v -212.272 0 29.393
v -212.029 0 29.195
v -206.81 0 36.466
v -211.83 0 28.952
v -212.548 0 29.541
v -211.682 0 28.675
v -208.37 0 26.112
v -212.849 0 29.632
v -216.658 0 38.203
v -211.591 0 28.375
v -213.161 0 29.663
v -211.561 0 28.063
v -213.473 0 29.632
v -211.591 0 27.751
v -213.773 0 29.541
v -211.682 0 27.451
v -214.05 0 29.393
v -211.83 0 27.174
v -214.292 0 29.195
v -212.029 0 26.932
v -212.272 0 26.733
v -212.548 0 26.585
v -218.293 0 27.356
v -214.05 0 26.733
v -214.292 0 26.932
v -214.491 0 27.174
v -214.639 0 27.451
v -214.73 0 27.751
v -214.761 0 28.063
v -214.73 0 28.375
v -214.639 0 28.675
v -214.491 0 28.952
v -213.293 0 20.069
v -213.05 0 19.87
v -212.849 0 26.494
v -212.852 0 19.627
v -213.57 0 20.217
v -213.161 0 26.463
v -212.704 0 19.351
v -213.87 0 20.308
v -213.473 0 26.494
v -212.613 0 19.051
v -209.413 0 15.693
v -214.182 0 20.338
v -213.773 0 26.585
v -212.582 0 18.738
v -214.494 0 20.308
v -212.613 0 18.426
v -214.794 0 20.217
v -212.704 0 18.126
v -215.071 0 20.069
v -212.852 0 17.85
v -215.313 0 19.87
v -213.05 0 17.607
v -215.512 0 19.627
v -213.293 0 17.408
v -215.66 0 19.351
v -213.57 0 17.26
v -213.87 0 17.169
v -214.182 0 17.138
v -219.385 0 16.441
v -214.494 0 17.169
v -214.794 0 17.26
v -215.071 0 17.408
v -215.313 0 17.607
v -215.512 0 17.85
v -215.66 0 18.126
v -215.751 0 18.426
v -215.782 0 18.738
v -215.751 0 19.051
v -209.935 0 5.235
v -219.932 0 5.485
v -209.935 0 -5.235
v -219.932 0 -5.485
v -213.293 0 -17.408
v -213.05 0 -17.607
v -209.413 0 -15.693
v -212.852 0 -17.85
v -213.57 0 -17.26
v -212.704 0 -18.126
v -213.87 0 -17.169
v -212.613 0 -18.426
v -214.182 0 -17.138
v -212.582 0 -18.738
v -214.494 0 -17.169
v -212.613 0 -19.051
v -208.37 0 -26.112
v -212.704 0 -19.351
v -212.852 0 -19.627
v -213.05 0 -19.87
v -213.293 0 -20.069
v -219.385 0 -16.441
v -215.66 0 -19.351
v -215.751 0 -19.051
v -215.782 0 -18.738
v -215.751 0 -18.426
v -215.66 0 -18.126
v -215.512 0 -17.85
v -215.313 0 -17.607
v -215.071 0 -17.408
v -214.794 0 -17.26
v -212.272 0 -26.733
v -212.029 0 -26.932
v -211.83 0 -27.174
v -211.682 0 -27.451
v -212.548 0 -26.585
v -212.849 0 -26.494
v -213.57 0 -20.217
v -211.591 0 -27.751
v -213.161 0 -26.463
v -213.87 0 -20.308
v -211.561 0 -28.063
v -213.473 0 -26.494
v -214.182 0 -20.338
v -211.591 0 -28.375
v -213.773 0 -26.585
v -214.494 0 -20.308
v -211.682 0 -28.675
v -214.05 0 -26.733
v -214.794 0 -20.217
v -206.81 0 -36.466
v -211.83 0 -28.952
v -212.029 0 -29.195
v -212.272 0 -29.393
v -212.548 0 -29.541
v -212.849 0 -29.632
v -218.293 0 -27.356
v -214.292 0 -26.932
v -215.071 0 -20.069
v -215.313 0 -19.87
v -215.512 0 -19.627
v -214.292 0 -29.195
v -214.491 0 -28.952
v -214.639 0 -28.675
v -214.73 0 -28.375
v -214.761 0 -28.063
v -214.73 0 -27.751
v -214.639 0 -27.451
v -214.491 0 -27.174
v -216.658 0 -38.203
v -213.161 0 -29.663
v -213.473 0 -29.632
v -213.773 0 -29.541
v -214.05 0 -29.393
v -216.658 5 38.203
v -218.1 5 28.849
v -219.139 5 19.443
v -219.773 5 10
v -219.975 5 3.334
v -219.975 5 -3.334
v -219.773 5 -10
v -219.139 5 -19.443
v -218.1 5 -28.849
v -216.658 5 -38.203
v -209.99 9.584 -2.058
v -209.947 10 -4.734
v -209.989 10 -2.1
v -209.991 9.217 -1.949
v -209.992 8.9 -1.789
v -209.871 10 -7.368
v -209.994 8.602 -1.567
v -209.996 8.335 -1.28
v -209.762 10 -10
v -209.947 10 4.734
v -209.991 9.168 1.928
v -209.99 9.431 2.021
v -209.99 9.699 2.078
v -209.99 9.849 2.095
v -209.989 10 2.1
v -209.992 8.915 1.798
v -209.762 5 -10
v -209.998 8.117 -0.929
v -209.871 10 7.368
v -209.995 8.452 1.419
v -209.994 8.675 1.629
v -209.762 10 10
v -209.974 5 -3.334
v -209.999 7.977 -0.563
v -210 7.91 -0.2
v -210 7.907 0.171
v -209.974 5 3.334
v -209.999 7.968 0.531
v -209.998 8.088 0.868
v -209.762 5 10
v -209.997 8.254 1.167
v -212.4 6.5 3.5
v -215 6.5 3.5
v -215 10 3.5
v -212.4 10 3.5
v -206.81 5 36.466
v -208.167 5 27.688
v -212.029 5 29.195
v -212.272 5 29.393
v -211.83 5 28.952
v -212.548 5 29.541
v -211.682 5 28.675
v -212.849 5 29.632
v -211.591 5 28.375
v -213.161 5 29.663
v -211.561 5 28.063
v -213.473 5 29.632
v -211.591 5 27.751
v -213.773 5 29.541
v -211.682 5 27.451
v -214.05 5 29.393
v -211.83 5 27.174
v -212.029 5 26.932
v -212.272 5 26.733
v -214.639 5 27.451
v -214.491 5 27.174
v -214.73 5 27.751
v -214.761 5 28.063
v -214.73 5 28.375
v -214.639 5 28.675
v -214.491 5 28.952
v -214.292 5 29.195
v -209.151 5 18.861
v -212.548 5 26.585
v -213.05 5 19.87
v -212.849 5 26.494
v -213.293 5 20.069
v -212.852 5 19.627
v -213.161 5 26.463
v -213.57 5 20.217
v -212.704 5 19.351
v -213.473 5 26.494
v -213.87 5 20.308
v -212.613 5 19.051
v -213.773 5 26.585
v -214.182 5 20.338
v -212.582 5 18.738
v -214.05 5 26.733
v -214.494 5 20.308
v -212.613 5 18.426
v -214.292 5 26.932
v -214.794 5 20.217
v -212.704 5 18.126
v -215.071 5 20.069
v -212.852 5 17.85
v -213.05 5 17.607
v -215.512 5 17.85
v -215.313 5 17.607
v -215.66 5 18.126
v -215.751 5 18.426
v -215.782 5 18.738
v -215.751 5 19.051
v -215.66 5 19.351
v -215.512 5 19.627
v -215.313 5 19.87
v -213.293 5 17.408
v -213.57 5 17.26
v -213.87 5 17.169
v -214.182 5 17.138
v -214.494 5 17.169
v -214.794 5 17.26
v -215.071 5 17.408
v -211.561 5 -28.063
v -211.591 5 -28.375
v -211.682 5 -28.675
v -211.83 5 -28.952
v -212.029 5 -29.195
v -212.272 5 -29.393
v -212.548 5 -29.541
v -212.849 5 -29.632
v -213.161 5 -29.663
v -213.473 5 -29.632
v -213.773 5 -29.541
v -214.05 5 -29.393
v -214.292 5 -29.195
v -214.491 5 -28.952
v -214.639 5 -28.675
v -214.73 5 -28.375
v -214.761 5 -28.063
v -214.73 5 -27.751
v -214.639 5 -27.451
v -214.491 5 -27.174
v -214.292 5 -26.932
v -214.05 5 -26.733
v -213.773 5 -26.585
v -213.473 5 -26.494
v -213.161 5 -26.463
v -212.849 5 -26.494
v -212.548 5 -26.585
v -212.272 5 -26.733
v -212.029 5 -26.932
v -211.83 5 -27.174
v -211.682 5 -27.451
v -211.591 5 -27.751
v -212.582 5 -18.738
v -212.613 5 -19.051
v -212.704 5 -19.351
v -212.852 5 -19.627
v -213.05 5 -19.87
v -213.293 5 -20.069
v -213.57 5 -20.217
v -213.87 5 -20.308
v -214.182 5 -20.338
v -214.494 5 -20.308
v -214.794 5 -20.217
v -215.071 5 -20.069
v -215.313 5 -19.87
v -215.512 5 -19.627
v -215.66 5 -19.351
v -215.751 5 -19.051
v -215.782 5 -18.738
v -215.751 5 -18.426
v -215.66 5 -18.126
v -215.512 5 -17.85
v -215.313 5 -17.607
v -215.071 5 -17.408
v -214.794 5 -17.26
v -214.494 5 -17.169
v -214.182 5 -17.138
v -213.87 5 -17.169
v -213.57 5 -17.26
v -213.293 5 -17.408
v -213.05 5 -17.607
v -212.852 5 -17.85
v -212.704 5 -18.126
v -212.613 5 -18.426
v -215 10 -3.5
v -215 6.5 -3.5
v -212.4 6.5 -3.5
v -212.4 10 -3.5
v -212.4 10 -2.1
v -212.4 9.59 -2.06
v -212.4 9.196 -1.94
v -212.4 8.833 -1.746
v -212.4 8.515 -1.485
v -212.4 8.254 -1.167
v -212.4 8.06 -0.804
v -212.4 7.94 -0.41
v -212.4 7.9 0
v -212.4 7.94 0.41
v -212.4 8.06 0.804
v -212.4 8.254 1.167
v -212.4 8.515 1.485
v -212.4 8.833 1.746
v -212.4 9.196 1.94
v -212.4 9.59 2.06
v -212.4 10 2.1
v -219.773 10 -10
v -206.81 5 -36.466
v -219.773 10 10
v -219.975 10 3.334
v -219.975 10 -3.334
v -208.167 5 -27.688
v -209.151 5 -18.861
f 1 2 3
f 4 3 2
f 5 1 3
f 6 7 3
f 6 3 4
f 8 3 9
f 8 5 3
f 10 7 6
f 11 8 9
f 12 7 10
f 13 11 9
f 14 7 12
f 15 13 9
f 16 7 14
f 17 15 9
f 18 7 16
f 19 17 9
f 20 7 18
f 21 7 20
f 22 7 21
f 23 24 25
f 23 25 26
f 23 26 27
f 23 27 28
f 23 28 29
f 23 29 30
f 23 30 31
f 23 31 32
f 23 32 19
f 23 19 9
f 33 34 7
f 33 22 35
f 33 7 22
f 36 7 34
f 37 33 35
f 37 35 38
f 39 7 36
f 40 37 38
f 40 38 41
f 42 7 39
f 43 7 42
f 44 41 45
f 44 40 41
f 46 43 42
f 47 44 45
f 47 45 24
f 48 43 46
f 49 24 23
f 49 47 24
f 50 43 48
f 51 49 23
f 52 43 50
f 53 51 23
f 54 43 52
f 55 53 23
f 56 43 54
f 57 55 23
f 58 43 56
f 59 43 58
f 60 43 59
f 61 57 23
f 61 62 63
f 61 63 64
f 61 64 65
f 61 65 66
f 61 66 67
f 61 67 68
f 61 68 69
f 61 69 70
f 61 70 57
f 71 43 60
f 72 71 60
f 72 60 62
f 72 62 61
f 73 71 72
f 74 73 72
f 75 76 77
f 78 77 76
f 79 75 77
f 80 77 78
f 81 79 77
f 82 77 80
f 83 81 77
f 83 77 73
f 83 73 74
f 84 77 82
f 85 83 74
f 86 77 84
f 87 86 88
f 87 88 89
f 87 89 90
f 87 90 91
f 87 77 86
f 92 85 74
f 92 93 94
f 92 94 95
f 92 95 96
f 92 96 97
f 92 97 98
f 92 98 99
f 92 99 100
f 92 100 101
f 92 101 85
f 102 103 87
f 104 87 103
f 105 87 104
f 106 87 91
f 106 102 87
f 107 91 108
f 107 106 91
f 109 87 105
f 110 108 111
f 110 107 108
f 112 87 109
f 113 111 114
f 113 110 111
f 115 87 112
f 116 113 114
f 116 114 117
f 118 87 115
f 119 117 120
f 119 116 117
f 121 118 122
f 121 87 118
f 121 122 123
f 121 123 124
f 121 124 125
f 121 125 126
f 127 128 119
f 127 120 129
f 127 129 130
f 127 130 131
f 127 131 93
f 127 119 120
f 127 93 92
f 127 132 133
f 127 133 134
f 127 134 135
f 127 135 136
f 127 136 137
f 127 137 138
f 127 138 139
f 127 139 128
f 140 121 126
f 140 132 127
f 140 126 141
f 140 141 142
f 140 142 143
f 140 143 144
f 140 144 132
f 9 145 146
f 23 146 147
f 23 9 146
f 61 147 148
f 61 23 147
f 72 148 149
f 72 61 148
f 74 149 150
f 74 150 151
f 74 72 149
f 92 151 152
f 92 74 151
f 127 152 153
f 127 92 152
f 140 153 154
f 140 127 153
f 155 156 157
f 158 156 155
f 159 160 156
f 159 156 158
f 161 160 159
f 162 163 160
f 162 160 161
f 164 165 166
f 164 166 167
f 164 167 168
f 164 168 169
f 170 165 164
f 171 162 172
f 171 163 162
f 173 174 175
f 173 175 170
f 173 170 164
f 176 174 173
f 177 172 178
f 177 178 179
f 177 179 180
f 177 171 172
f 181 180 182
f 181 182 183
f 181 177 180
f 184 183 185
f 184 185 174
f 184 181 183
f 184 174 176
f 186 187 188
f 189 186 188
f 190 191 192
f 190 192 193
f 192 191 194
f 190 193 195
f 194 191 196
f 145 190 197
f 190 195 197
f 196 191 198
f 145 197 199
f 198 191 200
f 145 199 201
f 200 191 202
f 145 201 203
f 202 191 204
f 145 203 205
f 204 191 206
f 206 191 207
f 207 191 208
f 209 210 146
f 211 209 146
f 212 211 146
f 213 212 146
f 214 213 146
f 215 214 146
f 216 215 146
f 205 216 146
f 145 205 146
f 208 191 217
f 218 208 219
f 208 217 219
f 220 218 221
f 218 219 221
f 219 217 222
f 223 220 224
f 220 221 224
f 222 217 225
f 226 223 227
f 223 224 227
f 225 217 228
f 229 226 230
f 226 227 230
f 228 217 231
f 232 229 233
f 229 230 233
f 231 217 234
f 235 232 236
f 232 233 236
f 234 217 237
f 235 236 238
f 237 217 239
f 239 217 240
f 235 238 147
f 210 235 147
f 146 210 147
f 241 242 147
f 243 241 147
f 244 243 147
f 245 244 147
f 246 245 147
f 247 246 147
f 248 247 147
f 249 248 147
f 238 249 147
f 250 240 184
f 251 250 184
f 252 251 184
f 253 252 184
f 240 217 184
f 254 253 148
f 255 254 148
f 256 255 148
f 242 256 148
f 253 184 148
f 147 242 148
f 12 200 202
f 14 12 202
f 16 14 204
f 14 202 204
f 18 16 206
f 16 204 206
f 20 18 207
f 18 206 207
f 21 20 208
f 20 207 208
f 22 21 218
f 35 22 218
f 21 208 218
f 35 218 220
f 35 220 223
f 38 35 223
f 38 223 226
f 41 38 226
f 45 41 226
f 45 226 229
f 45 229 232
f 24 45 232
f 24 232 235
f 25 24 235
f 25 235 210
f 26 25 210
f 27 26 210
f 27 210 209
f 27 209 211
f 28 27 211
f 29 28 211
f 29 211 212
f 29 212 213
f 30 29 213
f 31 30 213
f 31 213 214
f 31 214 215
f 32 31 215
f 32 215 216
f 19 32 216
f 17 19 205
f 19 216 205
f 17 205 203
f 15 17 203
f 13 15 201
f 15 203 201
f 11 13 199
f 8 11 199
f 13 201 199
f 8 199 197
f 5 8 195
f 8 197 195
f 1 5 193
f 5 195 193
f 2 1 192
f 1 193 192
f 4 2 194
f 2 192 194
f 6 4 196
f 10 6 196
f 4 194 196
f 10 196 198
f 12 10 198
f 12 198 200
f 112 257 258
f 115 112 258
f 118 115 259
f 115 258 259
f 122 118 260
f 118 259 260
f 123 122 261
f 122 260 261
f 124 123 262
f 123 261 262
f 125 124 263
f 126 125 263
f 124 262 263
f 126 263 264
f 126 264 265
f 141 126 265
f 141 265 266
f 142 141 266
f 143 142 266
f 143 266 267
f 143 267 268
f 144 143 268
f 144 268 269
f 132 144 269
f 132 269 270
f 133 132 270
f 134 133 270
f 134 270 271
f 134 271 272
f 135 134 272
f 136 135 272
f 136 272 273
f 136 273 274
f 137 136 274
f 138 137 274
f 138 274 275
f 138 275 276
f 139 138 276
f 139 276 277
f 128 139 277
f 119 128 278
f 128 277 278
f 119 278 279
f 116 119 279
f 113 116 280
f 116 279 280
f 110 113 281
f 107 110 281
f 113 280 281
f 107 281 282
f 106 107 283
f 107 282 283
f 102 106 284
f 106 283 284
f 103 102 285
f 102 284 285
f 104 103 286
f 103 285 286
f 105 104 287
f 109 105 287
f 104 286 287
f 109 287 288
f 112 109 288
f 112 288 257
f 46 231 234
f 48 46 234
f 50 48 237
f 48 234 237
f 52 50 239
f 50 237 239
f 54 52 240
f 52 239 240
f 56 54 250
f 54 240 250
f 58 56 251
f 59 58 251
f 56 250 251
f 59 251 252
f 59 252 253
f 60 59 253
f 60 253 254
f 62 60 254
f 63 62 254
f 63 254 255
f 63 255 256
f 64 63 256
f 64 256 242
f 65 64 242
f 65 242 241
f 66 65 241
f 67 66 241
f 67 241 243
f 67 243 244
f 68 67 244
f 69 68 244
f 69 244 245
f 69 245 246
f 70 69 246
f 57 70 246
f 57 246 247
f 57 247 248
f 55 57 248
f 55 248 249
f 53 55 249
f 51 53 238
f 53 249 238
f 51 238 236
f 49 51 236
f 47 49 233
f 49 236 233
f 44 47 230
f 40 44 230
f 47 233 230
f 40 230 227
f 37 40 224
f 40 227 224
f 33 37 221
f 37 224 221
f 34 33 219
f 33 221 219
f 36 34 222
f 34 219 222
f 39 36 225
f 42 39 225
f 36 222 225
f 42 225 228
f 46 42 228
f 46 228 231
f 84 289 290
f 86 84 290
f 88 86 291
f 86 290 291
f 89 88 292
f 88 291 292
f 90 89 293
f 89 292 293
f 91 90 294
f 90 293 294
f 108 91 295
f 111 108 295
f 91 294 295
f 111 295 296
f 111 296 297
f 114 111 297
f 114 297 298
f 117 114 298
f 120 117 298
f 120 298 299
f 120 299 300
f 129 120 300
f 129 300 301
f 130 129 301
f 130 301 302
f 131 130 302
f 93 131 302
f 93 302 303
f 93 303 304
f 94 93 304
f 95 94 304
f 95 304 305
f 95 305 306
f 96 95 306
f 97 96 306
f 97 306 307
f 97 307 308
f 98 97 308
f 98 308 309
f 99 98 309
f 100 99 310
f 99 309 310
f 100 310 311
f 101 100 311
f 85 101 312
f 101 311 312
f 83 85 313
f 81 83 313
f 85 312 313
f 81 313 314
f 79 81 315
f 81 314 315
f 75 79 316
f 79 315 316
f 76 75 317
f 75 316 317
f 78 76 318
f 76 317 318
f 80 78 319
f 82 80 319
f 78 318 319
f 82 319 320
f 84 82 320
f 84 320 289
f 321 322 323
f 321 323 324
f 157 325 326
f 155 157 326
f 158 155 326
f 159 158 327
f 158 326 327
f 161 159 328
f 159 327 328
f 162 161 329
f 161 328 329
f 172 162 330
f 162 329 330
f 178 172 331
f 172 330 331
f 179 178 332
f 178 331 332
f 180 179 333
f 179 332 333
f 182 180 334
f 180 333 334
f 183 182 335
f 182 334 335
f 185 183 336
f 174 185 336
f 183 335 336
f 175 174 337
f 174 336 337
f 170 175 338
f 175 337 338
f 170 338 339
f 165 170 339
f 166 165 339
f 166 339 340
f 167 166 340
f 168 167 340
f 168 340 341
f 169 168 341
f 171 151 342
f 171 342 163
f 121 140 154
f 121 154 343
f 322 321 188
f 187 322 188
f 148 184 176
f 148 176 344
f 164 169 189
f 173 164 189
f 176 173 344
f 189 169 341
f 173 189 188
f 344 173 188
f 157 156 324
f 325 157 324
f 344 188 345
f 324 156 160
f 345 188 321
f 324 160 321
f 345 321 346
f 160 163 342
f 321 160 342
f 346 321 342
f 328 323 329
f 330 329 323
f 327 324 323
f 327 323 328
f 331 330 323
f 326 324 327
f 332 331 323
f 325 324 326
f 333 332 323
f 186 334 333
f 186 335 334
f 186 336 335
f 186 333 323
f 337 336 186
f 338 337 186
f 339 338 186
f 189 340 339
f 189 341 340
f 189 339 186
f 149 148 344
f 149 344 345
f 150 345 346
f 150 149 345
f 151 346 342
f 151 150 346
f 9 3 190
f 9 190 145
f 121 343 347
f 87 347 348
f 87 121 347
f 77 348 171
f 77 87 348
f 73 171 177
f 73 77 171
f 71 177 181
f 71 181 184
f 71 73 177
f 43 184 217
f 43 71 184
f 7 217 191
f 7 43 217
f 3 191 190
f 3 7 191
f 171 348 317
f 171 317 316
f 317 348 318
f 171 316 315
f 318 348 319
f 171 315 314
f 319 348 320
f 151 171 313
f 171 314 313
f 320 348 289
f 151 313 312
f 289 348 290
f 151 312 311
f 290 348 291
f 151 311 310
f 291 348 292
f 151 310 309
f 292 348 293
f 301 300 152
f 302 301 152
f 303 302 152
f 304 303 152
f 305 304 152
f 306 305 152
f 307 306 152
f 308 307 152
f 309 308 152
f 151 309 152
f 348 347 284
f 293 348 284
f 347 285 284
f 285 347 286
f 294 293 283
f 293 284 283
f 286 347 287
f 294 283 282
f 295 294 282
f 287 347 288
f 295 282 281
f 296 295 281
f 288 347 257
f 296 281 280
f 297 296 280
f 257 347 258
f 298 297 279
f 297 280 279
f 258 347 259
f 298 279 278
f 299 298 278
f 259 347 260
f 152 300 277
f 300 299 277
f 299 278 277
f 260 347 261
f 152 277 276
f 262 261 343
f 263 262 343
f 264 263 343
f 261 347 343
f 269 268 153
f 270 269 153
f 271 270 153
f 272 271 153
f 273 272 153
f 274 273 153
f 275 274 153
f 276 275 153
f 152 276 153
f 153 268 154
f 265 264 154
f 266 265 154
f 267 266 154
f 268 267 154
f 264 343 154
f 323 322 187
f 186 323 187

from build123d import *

# Parameters (mm, degrees)
BOSS_EXTRUDE1_DEPTH        = 5
F_3_2_3_2_DIAMETER_HOLE1_D = 3.2
BOSS_EXTRUDE2_DEPTH        = 5
SKETCH10_W                 = 7
SKETCH10_H                 = 7
CUT_EXTRUDE2_DEPTH         = 2.6
SKETCH11_R                 = 2.1
CUT_EXTRUDE3_DEPTH         = 41.33014714


with BuildPart() as part:
    # Sketch1 → Boss-Extrude1 (new body)
    with BuildSketch(Plane(origin=(0, 0, 0), x_dir=(1, 0, 0), z_dir=(0, 1, 0))):
        with BuildLine():
            Line((-216.657705663, 38.202599087), (-206.809628133, 36.46611731))
            ThreePointArc((-206.809628133, 36.46611731), (-210, 0), (-206.809628133, -36.46611731))
            Line((-206.809628133, -36.46611731), (-216.657705663, -38.202599087))
            ThreePointArc((-216.657705663, -38.202599087), (-220, 0), (-216.657705663, 38.202599087))
        make_face()
    extrude(amount=BOSS_EXTRUDE1_DEPTH)

    # Ø3.2 (3.2) Diameter Hole1 (through all)
    with Locations(Plane(origin=(0, 0, 0), x_dir=(-1, 0, 0), z_dir=(0, -1, 0))):
        with Locations((214.18186009, -18.738484691), (214.18186009, 18.738484691), (213.160645195, -28.063131327), (213.160645195, 28.063131327)):
            Hole(F_3_2_3_2_DIAMETER_HOLE1_D / 2)

    # Sketch9 → Boss-Extrude2 (add)
    with BuildSketch(Plane(origin=(0, 5, 0), x_dir=(1, 0, 0), z_dir=(0, 1, 0))):
        with BuildLine():
            Line((-219.772609758, 10), (-209.761769634, 10))
            ThreePointArc((-209.761769634, 10), (-210, 0), (-209.761769634, -10))
            Line((-209.761769634, -10), (-219.772609758, -10))
            ThreePointArc((-219.772609758, -10), (-220, 0), (-219.772609758, 10))
        make_face()
    extrude(amount=BOSS_EXTRUDE2_DEPTH)

    # Sketch10 → Cut-Extrude2 (cut)
    with BuildSketch(Plane.ZY.offset(215)):
        with Locations((0, 10)):
            Rectangle(SKETCH10_W, SKETCH10_H)
    extrude(amount=-CUT_EXTRUDE2_DEPTH, mode=Mode.SUBTRACT)

    # Sketch11 → Cut-Extrude3 (cut, through all)
    with BuildSketch(Plane.ZY.offset(215)):
        with Locations((0, 10)):
            Circle(SKETCH11_R)
    extrude(amount=-CUT_EXTRUDE3_DEPTH, mode=Mode.SUBTRACT)


solid = part.part
